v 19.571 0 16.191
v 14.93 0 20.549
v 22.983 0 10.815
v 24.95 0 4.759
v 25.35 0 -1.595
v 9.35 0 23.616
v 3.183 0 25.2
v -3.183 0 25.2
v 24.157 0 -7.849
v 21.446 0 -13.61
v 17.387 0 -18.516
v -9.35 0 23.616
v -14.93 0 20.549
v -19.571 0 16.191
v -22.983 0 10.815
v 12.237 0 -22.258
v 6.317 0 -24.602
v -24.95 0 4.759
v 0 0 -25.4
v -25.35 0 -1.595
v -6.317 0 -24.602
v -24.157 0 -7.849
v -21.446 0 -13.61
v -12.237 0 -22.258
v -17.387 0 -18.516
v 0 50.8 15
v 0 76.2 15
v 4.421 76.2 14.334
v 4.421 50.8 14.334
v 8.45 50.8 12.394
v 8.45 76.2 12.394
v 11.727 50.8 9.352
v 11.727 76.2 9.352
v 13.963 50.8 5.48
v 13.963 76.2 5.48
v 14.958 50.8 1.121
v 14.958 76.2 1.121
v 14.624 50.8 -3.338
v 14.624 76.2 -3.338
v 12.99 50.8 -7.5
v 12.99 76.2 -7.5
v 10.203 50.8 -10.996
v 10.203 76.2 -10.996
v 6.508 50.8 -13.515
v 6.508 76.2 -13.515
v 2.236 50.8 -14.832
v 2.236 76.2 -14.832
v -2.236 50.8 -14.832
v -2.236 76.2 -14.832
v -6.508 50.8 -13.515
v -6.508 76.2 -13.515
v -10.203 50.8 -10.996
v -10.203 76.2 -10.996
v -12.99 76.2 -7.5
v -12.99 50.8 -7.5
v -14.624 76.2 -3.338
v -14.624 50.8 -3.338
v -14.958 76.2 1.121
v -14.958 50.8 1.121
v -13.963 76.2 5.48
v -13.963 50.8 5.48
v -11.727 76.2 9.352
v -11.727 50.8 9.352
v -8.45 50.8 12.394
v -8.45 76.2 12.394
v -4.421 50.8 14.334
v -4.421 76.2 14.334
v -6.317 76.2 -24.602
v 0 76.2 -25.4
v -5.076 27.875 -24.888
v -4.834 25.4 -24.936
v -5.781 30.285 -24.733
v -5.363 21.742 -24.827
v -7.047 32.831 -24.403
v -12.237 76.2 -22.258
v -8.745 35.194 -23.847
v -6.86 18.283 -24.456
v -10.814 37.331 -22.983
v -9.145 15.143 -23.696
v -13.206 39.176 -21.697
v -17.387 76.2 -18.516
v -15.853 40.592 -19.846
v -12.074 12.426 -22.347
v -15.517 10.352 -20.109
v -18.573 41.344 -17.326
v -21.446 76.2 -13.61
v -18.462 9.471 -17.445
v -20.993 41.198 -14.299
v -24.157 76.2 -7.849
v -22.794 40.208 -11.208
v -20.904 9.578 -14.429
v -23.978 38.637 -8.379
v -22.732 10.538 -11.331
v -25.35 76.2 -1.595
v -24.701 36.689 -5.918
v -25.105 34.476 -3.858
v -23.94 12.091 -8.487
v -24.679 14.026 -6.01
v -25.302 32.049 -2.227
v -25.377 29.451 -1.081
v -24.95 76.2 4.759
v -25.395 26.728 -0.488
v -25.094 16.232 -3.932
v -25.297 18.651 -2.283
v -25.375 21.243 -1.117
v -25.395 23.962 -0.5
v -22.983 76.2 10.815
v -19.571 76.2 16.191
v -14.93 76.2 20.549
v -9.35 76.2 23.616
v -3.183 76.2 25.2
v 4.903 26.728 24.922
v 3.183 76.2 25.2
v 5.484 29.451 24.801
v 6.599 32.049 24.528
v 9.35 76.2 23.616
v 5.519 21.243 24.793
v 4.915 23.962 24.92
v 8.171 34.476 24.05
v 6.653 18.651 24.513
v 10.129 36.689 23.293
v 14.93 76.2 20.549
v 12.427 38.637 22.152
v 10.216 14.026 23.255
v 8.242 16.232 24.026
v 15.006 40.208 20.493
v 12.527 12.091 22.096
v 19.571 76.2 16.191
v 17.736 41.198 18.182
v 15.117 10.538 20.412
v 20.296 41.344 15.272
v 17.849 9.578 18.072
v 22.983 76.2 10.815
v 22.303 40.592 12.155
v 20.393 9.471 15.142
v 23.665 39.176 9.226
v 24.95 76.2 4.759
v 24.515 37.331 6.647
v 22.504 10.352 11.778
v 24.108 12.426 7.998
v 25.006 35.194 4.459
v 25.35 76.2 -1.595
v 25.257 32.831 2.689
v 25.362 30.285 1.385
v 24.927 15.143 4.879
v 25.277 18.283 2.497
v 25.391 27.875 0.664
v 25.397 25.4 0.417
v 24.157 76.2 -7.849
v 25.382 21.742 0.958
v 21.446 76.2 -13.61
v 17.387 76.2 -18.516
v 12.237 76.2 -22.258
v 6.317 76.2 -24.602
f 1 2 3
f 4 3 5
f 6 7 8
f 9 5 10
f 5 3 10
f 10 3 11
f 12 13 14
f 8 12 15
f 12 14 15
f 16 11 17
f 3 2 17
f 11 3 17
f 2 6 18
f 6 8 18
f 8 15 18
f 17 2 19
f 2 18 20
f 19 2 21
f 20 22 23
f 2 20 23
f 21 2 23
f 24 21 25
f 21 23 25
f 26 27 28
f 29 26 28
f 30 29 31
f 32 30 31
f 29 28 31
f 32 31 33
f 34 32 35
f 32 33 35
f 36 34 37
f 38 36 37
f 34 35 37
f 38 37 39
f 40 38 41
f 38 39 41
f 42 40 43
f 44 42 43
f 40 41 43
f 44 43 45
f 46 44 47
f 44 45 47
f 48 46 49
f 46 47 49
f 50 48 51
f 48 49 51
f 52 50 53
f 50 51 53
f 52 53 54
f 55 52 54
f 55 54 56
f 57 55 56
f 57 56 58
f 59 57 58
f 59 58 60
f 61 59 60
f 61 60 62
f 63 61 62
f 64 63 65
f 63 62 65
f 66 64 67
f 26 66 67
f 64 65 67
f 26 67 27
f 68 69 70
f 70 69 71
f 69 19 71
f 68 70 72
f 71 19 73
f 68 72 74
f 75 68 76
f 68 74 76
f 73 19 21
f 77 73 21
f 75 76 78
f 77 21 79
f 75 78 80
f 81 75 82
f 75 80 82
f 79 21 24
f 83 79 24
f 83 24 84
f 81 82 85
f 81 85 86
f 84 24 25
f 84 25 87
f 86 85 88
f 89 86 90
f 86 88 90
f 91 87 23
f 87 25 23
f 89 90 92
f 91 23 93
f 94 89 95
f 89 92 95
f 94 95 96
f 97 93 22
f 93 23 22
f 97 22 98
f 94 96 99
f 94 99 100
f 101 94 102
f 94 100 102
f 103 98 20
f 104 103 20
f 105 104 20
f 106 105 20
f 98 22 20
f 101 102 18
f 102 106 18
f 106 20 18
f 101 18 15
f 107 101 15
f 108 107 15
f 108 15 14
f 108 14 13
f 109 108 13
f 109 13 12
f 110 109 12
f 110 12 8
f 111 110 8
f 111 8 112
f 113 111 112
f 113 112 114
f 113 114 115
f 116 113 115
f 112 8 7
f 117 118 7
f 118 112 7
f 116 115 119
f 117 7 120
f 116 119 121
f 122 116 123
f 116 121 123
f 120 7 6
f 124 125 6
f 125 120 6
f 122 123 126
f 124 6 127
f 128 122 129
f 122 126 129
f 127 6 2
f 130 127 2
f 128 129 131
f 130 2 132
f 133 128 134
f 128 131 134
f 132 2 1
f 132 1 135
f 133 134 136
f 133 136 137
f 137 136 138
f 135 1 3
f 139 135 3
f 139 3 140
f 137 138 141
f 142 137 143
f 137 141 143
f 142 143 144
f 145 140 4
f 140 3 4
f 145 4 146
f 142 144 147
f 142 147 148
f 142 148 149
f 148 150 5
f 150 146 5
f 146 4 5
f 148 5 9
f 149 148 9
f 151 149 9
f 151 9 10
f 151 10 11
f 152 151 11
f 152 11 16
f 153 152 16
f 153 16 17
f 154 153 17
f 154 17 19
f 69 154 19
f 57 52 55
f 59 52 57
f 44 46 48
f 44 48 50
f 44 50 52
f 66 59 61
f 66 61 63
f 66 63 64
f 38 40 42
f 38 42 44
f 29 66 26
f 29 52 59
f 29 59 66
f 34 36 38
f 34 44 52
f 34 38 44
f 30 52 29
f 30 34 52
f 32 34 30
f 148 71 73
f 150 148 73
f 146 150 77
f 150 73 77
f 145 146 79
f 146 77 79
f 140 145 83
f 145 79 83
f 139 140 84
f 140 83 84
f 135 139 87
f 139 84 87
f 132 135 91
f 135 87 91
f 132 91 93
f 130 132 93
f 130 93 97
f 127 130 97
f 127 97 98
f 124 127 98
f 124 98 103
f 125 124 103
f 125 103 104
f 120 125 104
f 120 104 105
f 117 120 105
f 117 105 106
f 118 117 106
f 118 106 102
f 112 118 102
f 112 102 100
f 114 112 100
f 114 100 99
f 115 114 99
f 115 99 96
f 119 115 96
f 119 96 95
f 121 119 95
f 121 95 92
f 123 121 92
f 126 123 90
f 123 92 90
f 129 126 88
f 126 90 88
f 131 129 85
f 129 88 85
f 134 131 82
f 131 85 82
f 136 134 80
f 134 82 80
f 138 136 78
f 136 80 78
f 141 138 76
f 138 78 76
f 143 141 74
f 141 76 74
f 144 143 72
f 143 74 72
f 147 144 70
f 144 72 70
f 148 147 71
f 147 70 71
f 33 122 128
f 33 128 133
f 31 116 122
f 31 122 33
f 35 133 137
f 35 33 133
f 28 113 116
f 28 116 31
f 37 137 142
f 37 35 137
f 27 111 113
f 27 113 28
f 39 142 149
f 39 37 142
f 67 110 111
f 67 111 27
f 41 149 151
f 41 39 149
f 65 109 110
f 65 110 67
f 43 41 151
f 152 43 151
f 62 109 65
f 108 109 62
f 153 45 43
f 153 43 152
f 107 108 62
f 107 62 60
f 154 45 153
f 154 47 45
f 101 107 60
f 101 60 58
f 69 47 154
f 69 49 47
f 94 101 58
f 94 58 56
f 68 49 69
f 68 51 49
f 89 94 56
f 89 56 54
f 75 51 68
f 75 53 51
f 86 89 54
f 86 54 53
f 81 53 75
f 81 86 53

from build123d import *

# Parameters (mm, degrees)
SKETCH1_R                    = 25.4
BOSS_EXTRUDE1_DEPTH          = 76.2
SKETCH2_R                    = 15
CUT_EXTRUDE1_DEPTH           = 25.4
F_12_8_12_8_DIAMETER_HOLE1_D = 32


with BuildPart() as part:
    # Sketch1 → Boss-Extrude1 (new body)
    with BuildSketch(Plane(origin=(0, 0, 0), x_dir=(1, 0, 0), z_dir=(0, 1, 0))):
        with Locations(Location((0, 0, 0), (0, 0, 90))):
            Circle(SKETCH1_R)
    extrude(amount=BOSS_EXTRUDE1_DEPTH)

    # Sketch2 → Cut-Extrude1 (cut)
    with BuildSketch(Plane(origin=(0, 76.2, 0), x_dir=(1, 0, 0), z_dir=(0, 1, 0))):
        with Locations(Location((0, 0, 0), (0, 0, 270))):
            Circle(SKETCH2_R)
    extrude(amount=-CUT_EXTRUDE1_DEPTH, mode=Mode.SUBTRACT)

    # Ø12.8 (12.8) Diameter Hole1 (through all)
    with Locations(Plane(origin=(19.461654008, 25.4, 16.321887859), x_dir=(-0.642594010206, 0, 0.766206850692), z_dir=(0.766206850692, 0, 0.642594010206))):
        with Locations((0, 0)):
            Hole(F_12_8_12_8_DIAMETER_HOLE1_D / 2)


solid = part.part
